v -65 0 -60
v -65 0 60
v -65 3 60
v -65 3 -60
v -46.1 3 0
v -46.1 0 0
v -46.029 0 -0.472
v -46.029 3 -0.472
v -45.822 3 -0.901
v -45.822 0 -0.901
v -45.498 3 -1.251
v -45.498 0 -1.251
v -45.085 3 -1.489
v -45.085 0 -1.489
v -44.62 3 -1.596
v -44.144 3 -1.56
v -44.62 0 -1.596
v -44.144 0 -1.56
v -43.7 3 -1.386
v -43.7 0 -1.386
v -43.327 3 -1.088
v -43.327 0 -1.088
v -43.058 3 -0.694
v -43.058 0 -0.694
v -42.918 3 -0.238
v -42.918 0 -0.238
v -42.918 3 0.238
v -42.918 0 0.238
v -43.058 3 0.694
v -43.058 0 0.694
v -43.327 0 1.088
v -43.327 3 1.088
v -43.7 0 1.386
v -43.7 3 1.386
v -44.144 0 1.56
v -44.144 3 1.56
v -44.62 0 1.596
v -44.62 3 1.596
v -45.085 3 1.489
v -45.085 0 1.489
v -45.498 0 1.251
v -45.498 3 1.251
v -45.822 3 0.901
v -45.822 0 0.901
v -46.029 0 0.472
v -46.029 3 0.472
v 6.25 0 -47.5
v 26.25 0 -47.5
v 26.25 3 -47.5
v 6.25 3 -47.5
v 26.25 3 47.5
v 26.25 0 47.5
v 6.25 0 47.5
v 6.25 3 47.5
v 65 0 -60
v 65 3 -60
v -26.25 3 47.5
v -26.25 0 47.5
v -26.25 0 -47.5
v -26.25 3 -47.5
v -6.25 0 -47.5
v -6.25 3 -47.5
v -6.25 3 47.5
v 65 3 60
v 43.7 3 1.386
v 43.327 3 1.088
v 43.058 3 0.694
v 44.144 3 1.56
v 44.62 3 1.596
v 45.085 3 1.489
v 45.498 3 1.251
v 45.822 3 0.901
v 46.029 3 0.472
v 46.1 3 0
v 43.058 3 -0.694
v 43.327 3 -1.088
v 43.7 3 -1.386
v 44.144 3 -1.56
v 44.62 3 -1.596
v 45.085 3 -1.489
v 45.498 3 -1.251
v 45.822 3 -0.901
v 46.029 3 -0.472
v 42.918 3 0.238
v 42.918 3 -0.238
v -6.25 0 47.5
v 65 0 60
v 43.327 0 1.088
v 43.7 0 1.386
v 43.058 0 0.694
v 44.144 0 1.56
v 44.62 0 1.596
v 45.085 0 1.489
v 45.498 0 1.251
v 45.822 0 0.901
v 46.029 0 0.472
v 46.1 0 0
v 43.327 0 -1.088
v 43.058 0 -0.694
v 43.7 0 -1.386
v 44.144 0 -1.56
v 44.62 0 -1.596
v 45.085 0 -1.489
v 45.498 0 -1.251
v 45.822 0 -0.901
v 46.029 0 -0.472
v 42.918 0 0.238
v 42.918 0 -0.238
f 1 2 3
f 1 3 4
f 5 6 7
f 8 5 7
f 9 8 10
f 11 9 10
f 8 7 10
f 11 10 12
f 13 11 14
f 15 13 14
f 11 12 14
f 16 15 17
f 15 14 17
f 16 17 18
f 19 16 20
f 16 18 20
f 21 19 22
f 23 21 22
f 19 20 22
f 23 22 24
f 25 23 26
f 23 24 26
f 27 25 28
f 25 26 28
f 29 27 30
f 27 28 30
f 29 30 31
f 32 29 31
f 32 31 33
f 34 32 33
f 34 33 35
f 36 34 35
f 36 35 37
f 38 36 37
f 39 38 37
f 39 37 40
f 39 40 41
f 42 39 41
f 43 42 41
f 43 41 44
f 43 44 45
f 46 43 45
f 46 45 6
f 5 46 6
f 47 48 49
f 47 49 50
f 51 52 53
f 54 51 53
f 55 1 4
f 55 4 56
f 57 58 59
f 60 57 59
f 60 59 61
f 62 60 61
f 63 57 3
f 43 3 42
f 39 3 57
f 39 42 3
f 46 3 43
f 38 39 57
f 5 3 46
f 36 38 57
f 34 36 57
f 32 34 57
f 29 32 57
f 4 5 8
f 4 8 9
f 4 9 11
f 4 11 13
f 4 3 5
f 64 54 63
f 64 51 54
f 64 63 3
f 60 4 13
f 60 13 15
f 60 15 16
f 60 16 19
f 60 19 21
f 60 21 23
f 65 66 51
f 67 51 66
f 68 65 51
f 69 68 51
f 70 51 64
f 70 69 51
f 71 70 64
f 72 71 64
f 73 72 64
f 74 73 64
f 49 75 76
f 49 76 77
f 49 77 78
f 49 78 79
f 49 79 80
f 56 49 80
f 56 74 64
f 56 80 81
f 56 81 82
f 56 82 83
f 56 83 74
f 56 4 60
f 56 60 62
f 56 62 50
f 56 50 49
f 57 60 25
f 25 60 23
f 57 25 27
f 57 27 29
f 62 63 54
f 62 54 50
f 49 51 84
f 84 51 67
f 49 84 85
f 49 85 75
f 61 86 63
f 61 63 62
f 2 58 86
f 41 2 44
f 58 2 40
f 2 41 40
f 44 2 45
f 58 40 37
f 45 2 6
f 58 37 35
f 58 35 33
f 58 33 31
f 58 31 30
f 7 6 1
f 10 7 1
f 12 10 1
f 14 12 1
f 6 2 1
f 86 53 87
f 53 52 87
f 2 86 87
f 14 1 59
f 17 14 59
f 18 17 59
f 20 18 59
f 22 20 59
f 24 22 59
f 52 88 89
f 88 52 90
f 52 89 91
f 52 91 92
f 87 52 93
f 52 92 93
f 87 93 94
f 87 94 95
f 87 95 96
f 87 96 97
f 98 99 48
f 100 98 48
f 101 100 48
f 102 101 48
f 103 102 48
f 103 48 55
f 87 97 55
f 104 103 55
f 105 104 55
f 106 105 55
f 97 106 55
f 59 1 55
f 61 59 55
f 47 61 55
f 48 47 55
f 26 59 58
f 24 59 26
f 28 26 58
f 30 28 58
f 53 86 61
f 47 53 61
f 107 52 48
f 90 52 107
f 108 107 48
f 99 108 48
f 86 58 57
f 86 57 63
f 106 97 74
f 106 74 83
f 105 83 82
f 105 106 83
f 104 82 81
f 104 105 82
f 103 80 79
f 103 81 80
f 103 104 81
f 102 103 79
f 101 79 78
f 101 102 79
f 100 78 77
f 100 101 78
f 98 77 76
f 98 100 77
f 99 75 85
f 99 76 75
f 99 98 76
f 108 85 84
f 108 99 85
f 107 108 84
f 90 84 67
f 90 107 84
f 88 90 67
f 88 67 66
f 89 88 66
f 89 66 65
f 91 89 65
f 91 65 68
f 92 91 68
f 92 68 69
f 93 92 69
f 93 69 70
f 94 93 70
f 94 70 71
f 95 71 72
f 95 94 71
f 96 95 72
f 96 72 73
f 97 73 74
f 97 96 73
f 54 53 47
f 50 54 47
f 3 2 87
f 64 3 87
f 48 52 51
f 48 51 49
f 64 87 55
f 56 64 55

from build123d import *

# Parameters (mm, degrees)
SKETCH1_W           = 130
SKETCH1_H           = 120
BOSS_EXTRUDE1_DEPTH = 3
CUT_EXTRUDE1_START  = -4
SKETCH2_W           = 20
SKETCH2_H           = 95
CUT_EXTRUDE1_DEPTH  = 5
CUT_EXTRUDE2_START  = -4
SKETCH3_R           = 1.6
CUT_EXTRUDE2_DEPTH  = 5


with BuildPart() as part:
    # Sketch1 → Boss-Extrude1 (new body)
    with BuildSketch(Plane(origin=(0, 0, 0), x_dir=(1, 0, 0), z_dir=(0, 1, 0))):
        Rectangle(SKETCH1_W, SKETCH1_H)
    extrude(amount=BOSS_EXTRUDE1_DEPTH)

    # Sketch2 → Cut-Extrude1 (cut)
    with BuildSketch(Plane(origin=(0, 3, 0), x_dir=(1, 0, 0), z_dir=(0, 1, 0)).offset(CUT_EXTRUDE1_START)):
        with Locations((-16.25, 0)):
            Rectangle(SKETCH2_W, SKETCH2_H)
    cut_extrude1 = extrude(amount=CUT_EXTRUDE1_DEPTH, mode=Mode.SUBTRACT)

    # Mirror1: Cut-Extrude1 across plane
    add(cut_extrude1.mirror(Plane(origin=(0, 0, 0), x_dir=(0, 0, 1), z_dir=(1, 0, 0))), mode=Mode.SUBTRACT)

    # Sketch3 → Cut-Extrude2 (cut)
    with BuildSketch(Plane(origin=(0, 3, 0), x_dir=(1, 0, 0), z_dir=(0, 1, 0)).offset(CUT_EXTRUDE2_START)):
        with Locations((44.5, 0)):
            Circle(SKETCH3_R)
    cut_extrude2 = extrude(amount=CUT_EXTRUDE2_DEPTH, mode=Mode.SUBTRACT)

    # Mirror2: Cut-Extrude2 across plane
    add(cut_extrude2.mirror(Plane(origin=(0, 0, 0), x_dir=(0, 0, 1), z_dir=(1, 0, 0))), mode=Mode.SUBTRACT)


solid = part.part
